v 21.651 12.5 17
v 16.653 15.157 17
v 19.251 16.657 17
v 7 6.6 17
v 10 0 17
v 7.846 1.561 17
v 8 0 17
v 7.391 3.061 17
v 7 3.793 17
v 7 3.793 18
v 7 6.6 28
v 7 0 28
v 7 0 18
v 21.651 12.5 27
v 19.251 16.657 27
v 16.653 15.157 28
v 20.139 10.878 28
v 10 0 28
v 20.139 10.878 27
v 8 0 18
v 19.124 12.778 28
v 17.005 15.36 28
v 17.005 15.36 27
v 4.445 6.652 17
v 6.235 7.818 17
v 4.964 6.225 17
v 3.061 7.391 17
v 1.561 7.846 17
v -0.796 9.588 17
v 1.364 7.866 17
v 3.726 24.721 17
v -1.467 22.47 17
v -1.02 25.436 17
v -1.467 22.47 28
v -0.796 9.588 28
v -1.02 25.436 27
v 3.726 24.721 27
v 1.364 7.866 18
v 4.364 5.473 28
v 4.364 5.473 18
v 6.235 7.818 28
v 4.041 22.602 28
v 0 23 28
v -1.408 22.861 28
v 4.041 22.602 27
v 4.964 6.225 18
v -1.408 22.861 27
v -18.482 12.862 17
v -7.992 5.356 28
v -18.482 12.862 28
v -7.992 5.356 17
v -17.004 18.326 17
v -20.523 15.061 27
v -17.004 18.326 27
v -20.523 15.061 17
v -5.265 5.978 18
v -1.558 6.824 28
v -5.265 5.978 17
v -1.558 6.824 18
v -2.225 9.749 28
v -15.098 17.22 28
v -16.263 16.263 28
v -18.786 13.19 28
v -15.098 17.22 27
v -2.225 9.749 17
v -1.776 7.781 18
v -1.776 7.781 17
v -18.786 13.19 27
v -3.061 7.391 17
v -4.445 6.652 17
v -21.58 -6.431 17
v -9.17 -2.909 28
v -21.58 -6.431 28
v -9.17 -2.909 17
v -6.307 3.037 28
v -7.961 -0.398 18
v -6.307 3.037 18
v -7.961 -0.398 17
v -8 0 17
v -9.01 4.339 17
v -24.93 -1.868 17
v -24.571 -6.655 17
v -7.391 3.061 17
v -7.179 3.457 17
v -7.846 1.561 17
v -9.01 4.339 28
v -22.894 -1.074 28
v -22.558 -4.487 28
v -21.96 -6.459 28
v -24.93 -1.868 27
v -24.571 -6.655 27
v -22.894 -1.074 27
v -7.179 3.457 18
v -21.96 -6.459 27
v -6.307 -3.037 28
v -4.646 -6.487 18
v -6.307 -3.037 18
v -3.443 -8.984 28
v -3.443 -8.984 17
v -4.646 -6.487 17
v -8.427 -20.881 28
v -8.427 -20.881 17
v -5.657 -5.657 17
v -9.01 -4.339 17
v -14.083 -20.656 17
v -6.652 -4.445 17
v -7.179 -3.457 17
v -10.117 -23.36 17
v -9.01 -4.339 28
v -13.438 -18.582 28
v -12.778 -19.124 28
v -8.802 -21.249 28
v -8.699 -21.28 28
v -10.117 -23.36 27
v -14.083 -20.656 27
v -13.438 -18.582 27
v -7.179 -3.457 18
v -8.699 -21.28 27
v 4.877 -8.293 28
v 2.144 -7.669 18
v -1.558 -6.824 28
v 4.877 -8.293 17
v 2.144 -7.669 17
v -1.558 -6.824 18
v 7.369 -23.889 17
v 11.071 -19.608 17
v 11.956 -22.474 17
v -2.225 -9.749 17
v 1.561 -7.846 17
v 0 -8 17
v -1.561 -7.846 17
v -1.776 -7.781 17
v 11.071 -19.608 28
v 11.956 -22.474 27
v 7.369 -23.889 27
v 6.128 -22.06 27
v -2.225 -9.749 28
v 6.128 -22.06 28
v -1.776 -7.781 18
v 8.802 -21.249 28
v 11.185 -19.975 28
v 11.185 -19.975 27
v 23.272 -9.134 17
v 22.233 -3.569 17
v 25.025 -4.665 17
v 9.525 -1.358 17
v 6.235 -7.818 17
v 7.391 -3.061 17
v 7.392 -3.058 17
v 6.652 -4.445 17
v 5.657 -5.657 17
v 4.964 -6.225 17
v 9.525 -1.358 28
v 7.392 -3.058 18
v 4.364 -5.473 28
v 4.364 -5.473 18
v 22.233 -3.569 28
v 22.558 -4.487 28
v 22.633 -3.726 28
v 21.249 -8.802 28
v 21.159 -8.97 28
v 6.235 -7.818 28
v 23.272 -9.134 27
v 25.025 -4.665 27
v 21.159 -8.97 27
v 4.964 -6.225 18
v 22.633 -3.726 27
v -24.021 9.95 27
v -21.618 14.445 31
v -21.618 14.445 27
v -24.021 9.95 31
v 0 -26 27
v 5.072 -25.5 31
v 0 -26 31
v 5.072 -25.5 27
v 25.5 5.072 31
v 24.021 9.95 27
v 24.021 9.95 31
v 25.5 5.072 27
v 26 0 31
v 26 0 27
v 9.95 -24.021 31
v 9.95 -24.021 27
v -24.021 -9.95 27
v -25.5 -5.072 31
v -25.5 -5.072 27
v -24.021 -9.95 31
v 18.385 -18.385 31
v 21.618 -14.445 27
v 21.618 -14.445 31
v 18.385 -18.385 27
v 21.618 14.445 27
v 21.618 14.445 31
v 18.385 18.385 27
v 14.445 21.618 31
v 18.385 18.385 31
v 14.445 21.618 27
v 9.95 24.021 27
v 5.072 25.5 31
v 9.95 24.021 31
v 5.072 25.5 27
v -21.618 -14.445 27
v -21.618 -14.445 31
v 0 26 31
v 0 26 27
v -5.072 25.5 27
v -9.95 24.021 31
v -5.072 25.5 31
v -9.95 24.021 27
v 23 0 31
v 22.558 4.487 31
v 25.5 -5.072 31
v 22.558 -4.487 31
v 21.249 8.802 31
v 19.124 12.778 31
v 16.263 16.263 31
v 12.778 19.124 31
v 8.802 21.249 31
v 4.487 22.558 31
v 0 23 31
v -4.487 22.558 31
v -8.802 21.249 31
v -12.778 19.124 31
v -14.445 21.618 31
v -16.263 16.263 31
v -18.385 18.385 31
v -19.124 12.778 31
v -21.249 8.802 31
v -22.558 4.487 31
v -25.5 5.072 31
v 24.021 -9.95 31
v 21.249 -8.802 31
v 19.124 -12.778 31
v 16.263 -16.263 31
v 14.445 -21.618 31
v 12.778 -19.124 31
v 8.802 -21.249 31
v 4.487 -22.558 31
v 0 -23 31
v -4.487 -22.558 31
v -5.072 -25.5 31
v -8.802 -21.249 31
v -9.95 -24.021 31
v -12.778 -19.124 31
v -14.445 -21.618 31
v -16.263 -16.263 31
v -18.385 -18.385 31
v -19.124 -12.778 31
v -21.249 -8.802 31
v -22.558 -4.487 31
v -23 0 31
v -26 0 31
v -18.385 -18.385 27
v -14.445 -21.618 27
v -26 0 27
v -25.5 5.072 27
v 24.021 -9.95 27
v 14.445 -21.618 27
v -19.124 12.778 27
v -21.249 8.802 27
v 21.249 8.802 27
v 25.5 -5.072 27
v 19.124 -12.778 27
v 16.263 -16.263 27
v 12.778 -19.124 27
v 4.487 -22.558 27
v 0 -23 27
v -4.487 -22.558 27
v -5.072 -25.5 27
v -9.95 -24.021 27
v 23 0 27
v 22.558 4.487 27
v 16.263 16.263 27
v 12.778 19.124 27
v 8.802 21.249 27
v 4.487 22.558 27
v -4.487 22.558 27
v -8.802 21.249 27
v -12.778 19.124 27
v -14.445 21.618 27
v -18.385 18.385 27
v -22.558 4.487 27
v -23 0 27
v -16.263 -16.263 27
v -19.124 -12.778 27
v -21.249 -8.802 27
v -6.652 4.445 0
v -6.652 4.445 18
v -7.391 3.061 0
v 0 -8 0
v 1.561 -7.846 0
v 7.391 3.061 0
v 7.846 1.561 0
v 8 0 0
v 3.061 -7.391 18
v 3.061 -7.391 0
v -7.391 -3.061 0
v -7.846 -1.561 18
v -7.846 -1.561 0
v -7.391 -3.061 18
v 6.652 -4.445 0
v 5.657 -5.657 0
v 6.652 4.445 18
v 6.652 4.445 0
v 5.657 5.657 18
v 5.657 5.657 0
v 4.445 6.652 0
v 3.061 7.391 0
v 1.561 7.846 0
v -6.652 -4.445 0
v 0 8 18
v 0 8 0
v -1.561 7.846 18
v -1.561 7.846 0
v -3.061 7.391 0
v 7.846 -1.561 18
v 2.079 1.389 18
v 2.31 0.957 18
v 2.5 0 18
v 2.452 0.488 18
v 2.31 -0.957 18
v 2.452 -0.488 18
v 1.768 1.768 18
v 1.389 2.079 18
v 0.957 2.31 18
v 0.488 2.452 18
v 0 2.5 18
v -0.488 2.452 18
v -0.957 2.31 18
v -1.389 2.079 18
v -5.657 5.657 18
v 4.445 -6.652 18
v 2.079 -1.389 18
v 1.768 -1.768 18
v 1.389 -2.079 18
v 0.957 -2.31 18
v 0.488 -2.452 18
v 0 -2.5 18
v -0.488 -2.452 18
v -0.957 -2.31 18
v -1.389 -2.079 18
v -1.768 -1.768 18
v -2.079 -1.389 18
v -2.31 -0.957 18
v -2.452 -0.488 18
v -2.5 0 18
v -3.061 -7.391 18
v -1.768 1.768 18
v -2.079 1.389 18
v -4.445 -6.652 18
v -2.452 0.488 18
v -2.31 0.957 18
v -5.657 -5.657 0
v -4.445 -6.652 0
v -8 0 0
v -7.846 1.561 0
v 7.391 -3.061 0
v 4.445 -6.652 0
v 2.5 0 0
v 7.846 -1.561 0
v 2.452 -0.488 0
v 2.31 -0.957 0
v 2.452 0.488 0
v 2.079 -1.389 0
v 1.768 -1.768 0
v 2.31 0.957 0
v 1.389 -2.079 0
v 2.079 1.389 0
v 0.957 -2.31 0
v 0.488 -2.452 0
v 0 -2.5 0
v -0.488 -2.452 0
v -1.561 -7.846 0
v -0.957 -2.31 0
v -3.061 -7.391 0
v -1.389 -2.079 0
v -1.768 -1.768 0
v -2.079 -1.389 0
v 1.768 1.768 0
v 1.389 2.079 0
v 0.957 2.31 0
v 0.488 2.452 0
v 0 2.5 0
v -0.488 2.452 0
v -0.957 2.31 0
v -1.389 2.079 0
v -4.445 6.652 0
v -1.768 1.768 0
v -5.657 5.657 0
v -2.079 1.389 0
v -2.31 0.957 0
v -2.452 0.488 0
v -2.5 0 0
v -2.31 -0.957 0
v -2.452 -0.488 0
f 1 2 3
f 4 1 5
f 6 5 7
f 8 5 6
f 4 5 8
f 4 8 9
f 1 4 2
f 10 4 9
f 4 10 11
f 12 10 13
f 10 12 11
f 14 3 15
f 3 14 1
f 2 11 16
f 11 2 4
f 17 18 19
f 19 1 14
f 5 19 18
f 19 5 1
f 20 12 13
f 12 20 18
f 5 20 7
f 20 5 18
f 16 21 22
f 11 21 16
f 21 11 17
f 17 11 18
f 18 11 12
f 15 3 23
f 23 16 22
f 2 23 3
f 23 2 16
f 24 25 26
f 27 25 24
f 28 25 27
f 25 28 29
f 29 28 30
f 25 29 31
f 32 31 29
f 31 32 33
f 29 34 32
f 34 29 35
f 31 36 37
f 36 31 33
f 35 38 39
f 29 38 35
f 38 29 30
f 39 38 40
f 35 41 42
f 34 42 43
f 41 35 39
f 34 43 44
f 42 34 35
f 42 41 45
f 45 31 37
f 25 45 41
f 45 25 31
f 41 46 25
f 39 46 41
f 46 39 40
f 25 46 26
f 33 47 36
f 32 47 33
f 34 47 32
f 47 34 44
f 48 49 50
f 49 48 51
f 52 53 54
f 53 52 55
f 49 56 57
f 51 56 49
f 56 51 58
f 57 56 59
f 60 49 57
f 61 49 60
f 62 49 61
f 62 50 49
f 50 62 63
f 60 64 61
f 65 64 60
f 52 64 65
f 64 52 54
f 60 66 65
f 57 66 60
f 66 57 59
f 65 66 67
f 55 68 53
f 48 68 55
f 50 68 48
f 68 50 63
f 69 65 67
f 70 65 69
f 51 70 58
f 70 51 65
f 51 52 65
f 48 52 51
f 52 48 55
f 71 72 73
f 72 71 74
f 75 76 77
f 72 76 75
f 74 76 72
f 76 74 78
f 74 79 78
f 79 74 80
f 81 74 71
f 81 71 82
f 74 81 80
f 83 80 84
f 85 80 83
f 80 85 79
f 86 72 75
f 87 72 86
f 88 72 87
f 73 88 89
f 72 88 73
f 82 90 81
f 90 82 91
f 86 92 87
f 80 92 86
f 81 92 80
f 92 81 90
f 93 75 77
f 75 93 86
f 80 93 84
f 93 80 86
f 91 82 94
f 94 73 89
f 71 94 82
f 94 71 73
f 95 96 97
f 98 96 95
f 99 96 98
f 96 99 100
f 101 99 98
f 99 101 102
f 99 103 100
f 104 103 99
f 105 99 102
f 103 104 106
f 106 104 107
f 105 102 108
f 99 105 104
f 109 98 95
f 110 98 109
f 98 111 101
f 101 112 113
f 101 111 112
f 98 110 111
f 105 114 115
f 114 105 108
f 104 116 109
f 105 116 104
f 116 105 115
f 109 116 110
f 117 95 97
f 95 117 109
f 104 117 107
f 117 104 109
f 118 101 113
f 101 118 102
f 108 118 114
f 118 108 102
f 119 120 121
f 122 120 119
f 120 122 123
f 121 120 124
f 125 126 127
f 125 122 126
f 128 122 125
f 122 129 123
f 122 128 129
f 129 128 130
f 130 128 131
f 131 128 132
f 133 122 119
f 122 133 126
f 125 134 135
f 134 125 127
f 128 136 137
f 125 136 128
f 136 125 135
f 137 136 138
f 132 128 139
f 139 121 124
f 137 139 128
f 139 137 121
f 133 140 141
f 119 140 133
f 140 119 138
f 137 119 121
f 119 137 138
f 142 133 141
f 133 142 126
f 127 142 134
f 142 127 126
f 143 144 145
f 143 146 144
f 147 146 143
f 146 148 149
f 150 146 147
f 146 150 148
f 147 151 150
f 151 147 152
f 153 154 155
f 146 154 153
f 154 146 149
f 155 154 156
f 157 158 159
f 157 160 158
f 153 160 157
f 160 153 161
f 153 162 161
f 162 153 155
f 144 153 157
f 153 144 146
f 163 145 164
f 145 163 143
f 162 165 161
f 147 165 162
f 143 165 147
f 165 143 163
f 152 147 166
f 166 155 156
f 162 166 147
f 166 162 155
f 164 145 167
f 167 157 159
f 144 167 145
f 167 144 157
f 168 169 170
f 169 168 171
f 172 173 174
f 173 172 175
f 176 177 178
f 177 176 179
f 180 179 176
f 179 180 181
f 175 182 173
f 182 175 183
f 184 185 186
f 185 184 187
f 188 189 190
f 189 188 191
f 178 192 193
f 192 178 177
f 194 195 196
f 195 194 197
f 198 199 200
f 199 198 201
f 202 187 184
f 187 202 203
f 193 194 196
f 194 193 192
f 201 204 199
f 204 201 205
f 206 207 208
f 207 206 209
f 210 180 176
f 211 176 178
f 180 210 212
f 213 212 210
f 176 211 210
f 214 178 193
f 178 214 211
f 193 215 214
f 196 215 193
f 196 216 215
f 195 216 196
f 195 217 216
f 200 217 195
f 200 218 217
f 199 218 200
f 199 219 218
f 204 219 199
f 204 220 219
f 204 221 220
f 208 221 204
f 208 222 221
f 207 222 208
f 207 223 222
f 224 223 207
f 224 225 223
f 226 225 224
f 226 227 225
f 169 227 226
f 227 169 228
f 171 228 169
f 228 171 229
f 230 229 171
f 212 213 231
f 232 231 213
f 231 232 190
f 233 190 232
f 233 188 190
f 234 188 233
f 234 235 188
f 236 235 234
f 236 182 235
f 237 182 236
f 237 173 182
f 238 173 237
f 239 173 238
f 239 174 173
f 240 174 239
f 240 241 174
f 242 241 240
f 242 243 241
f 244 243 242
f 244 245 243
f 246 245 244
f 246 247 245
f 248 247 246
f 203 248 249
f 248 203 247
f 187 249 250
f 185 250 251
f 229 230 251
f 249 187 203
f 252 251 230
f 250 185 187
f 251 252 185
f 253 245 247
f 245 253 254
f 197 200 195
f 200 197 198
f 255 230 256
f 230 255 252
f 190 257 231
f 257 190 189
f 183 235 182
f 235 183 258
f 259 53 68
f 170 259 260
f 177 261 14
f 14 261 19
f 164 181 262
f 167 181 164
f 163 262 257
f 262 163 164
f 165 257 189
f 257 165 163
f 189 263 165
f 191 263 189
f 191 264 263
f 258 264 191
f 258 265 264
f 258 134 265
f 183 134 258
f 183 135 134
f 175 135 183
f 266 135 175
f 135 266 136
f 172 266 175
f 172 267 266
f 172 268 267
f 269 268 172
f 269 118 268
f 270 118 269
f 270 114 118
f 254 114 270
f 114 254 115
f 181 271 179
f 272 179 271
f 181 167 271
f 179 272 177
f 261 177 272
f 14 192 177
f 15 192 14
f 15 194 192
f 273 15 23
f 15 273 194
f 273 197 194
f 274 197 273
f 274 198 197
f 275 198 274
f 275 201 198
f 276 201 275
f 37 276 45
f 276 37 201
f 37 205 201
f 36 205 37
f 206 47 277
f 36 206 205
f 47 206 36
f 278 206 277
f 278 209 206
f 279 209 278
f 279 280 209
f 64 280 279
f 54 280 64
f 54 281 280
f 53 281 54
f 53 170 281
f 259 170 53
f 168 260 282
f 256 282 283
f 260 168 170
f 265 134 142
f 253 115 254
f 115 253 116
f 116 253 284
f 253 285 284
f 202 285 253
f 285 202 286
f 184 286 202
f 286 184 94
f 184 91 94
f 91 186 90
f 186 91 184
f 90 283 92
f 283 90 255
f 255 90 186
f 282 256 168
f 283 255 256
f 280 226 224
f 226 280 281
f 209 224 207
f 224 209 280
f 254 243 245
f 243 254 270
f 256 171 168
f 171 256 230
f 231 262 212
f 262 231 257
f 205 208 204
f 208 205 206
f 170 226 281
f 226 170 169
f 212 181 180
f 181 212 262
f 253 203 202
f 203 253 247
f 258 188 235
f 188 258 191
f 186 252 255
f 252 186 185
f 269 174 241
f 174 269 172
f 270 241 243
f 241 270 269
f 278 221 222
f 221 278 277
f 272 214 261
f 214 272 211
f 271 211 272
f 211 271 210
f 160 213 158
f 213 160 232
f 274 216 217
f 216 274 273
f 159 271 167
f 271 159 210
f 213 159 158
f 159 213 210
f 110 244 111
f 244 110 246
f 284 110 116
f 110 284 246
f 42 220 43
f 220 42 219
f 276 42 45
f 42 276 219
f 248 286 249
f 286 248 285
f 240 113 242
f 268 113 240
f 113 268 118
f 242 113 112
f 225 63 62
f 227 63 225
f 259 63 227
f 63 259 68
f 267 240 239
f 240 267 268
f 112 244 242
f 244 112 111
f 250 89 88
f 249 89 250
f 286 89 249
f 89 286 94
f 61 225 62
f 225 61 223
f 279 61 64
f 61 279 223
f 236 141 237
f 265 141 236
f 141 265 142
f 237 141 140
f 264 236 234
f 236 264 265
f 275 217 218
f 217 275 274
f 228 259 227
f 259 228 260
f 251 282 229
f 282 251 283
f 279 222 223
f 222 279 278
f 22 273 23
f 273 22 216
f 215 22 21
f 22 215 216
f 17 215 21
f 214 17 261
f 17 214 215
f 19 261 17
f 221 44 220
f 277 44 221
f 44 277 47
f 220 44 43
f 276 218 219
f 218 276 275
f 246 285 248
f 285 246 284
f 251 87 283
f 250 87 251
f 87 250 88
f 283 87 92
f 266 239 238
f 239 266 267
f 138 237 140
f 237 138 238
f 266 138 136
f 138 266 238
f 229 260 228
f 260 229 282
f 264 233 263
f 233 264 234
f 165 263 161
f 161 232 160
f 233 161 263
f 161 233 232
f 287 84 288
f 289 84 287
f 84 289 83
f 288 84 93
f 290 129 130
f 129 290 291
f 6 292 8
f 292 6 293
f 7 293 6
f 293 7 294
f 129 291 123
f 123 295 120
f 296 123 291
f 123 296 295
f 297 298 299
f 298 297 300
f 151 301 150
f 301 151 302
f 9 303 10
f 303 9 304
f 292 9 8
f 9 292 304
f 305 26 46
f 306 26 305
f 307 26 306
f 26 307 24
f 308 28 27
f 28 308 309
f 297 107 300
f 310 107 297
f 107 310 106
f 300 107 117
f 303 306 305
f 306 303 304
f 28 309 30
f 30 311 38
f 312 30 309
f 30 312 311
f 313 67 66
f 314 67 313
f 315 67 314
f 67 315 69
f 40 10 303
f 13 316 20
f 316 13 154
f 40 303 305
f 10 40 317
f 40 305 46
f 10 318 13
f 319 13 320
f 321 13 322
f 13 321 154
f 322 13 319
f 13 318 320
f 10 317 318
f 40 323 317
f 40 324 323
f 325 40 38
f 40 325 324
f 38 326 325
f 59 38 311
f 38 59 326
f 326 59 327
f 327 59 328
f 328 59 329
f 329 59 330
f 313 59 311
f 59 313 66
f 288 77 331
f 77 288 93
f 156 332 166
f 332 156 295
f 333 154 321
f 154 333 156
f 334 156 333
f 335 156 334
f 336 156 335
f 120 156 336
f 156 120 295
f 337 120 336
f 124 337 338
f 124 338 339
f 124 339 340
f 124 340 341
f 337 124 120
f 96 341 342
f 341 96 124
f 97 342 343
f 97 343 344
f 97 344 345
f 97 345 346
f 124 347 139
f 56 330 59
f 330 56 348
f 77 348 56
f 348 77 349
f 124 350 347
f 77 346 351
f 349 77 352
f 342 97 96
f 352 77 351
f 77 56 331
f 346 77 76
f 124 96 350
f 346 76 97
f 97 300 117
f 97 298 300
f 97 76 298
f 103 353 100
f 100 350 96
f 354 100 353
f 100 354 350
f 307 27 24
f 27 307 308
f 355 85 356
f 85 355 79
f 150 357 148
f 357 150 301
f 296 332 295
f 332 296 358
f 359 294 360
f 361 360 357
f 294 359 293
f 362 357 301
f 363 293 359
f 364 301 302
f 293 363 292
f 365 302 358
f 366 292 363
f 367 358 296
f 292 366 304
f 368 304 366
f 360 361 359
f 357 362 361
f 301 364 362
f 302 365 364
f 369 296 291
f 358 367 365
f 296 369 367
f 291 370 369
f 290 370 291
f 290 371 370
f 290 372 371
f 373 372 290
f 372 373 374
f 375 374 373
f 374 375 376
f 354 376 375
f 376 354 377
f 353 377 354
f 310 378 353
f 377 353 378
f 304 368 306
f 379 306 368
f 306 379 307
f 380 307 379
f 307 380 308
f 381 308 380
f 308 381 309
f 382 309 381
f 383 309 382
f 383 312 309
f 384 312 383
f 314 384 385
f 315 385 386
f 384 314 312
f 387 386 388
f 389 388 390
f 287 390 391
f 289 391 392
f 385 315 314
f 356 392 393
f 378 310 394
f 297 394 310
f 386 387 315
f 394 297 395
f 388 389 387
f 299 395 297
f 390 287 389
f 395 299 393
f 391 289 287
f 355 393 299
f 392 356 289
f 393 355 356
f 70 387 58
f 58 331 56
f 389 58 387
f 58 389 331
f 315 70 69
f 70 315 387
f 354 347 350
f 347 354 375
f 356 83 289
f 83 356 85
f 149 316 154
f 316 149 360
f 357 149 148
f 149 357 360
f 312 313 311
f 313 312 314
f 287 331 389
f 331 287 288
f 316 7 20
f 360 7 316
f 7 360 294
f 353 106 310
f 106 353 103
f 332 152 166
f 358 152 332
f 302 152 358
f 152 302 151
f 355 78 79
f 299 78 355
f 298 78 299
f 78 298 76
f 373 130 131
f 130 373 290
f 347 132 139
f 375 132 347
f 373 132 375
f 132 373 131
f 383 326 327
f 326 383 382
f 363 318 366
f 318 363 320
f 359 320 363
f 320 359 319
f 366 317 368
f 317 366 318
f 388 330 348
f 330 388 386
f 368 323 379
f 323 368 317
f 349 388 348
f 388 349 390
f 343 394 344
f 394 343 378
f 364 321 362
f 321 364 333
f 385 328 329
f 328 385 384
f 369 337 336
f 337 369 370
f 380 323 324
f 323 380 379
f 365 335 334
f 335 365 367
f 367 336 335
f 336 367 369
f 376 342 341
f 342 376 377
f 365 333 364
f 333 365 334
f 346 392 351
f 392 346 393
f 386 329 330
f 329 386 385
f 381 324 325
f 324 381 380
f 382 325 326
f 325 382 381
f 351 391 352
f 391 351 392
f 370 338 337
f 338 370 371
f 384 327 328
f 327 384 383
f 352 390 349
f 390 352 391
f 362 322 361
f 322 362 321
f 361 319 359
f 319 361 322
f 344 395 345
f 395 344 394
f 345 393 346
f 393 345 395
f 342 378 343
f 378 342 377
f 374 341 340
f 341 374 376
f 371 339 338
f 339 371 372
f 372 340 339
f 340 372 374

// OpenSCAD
$fn = 32;

// ----------------------------------------------------------------------
// Impeller: 50 mm, 7 blades, 31 mm tall
// ----------------------------------------------------------------------

// --- parameters (mm) ---
center_d = 16;            // hub diameter
center_h = 18;            // hub height
wheel_d = 50;             // outer diameter over the blades
blade_count = 7;          // number of blades
blade_t = 3;              // blade thickness
blade_h = 10;             // blade height
blade_in_r = 7;           // blade root radius
blade_out_r = 22;         // blade tip radius
sweep = 30;               // blade sweep, degrees
bore_d = 5;               // shaft bore
shroud_h = 3;             // shroud ring thickness
shroud_d = 52;            // shroud outside diameter

module hub() {
  cylinder(h = center_h, d = center_d);
}

module blade() {
  /* blade swept between two boxes: hull of the root and the tip section */
  hull() {
    translate([blade_in_r, 0, center_h - 1])
      cube([blade_t, blade_t * 2.2, blade_h + 1], center = false);
    rotate([0, 0, sweep])
      translate([blade_out_r, 0, center_h - 1])
        cube([blade_t, blade_t * 1.6, blade_h + 1], center = false);
  }
}

module blades() {
  for (i = [0 : blade_count - 1])
    rotate([0, 0, i * 360 / blade_count]) blade();
}

module shroud() {
  translate([0, 0, center_h + blade_h - 1])
    difference() {
      cylinder(h = shroud_h + 1, d = shroud_d);
      translate([0, 0, -1]) cylinder(h = shroud_h + 3, d = shroud_d - 2 * 3);
    }
}

difference() {
  union() {
    hub();
    blades();
    shroud();
  }
  translate([0, 0, -1]) cylinder(h = center_h + blade_h + shroud_h + 3, d = bore_d);
}
